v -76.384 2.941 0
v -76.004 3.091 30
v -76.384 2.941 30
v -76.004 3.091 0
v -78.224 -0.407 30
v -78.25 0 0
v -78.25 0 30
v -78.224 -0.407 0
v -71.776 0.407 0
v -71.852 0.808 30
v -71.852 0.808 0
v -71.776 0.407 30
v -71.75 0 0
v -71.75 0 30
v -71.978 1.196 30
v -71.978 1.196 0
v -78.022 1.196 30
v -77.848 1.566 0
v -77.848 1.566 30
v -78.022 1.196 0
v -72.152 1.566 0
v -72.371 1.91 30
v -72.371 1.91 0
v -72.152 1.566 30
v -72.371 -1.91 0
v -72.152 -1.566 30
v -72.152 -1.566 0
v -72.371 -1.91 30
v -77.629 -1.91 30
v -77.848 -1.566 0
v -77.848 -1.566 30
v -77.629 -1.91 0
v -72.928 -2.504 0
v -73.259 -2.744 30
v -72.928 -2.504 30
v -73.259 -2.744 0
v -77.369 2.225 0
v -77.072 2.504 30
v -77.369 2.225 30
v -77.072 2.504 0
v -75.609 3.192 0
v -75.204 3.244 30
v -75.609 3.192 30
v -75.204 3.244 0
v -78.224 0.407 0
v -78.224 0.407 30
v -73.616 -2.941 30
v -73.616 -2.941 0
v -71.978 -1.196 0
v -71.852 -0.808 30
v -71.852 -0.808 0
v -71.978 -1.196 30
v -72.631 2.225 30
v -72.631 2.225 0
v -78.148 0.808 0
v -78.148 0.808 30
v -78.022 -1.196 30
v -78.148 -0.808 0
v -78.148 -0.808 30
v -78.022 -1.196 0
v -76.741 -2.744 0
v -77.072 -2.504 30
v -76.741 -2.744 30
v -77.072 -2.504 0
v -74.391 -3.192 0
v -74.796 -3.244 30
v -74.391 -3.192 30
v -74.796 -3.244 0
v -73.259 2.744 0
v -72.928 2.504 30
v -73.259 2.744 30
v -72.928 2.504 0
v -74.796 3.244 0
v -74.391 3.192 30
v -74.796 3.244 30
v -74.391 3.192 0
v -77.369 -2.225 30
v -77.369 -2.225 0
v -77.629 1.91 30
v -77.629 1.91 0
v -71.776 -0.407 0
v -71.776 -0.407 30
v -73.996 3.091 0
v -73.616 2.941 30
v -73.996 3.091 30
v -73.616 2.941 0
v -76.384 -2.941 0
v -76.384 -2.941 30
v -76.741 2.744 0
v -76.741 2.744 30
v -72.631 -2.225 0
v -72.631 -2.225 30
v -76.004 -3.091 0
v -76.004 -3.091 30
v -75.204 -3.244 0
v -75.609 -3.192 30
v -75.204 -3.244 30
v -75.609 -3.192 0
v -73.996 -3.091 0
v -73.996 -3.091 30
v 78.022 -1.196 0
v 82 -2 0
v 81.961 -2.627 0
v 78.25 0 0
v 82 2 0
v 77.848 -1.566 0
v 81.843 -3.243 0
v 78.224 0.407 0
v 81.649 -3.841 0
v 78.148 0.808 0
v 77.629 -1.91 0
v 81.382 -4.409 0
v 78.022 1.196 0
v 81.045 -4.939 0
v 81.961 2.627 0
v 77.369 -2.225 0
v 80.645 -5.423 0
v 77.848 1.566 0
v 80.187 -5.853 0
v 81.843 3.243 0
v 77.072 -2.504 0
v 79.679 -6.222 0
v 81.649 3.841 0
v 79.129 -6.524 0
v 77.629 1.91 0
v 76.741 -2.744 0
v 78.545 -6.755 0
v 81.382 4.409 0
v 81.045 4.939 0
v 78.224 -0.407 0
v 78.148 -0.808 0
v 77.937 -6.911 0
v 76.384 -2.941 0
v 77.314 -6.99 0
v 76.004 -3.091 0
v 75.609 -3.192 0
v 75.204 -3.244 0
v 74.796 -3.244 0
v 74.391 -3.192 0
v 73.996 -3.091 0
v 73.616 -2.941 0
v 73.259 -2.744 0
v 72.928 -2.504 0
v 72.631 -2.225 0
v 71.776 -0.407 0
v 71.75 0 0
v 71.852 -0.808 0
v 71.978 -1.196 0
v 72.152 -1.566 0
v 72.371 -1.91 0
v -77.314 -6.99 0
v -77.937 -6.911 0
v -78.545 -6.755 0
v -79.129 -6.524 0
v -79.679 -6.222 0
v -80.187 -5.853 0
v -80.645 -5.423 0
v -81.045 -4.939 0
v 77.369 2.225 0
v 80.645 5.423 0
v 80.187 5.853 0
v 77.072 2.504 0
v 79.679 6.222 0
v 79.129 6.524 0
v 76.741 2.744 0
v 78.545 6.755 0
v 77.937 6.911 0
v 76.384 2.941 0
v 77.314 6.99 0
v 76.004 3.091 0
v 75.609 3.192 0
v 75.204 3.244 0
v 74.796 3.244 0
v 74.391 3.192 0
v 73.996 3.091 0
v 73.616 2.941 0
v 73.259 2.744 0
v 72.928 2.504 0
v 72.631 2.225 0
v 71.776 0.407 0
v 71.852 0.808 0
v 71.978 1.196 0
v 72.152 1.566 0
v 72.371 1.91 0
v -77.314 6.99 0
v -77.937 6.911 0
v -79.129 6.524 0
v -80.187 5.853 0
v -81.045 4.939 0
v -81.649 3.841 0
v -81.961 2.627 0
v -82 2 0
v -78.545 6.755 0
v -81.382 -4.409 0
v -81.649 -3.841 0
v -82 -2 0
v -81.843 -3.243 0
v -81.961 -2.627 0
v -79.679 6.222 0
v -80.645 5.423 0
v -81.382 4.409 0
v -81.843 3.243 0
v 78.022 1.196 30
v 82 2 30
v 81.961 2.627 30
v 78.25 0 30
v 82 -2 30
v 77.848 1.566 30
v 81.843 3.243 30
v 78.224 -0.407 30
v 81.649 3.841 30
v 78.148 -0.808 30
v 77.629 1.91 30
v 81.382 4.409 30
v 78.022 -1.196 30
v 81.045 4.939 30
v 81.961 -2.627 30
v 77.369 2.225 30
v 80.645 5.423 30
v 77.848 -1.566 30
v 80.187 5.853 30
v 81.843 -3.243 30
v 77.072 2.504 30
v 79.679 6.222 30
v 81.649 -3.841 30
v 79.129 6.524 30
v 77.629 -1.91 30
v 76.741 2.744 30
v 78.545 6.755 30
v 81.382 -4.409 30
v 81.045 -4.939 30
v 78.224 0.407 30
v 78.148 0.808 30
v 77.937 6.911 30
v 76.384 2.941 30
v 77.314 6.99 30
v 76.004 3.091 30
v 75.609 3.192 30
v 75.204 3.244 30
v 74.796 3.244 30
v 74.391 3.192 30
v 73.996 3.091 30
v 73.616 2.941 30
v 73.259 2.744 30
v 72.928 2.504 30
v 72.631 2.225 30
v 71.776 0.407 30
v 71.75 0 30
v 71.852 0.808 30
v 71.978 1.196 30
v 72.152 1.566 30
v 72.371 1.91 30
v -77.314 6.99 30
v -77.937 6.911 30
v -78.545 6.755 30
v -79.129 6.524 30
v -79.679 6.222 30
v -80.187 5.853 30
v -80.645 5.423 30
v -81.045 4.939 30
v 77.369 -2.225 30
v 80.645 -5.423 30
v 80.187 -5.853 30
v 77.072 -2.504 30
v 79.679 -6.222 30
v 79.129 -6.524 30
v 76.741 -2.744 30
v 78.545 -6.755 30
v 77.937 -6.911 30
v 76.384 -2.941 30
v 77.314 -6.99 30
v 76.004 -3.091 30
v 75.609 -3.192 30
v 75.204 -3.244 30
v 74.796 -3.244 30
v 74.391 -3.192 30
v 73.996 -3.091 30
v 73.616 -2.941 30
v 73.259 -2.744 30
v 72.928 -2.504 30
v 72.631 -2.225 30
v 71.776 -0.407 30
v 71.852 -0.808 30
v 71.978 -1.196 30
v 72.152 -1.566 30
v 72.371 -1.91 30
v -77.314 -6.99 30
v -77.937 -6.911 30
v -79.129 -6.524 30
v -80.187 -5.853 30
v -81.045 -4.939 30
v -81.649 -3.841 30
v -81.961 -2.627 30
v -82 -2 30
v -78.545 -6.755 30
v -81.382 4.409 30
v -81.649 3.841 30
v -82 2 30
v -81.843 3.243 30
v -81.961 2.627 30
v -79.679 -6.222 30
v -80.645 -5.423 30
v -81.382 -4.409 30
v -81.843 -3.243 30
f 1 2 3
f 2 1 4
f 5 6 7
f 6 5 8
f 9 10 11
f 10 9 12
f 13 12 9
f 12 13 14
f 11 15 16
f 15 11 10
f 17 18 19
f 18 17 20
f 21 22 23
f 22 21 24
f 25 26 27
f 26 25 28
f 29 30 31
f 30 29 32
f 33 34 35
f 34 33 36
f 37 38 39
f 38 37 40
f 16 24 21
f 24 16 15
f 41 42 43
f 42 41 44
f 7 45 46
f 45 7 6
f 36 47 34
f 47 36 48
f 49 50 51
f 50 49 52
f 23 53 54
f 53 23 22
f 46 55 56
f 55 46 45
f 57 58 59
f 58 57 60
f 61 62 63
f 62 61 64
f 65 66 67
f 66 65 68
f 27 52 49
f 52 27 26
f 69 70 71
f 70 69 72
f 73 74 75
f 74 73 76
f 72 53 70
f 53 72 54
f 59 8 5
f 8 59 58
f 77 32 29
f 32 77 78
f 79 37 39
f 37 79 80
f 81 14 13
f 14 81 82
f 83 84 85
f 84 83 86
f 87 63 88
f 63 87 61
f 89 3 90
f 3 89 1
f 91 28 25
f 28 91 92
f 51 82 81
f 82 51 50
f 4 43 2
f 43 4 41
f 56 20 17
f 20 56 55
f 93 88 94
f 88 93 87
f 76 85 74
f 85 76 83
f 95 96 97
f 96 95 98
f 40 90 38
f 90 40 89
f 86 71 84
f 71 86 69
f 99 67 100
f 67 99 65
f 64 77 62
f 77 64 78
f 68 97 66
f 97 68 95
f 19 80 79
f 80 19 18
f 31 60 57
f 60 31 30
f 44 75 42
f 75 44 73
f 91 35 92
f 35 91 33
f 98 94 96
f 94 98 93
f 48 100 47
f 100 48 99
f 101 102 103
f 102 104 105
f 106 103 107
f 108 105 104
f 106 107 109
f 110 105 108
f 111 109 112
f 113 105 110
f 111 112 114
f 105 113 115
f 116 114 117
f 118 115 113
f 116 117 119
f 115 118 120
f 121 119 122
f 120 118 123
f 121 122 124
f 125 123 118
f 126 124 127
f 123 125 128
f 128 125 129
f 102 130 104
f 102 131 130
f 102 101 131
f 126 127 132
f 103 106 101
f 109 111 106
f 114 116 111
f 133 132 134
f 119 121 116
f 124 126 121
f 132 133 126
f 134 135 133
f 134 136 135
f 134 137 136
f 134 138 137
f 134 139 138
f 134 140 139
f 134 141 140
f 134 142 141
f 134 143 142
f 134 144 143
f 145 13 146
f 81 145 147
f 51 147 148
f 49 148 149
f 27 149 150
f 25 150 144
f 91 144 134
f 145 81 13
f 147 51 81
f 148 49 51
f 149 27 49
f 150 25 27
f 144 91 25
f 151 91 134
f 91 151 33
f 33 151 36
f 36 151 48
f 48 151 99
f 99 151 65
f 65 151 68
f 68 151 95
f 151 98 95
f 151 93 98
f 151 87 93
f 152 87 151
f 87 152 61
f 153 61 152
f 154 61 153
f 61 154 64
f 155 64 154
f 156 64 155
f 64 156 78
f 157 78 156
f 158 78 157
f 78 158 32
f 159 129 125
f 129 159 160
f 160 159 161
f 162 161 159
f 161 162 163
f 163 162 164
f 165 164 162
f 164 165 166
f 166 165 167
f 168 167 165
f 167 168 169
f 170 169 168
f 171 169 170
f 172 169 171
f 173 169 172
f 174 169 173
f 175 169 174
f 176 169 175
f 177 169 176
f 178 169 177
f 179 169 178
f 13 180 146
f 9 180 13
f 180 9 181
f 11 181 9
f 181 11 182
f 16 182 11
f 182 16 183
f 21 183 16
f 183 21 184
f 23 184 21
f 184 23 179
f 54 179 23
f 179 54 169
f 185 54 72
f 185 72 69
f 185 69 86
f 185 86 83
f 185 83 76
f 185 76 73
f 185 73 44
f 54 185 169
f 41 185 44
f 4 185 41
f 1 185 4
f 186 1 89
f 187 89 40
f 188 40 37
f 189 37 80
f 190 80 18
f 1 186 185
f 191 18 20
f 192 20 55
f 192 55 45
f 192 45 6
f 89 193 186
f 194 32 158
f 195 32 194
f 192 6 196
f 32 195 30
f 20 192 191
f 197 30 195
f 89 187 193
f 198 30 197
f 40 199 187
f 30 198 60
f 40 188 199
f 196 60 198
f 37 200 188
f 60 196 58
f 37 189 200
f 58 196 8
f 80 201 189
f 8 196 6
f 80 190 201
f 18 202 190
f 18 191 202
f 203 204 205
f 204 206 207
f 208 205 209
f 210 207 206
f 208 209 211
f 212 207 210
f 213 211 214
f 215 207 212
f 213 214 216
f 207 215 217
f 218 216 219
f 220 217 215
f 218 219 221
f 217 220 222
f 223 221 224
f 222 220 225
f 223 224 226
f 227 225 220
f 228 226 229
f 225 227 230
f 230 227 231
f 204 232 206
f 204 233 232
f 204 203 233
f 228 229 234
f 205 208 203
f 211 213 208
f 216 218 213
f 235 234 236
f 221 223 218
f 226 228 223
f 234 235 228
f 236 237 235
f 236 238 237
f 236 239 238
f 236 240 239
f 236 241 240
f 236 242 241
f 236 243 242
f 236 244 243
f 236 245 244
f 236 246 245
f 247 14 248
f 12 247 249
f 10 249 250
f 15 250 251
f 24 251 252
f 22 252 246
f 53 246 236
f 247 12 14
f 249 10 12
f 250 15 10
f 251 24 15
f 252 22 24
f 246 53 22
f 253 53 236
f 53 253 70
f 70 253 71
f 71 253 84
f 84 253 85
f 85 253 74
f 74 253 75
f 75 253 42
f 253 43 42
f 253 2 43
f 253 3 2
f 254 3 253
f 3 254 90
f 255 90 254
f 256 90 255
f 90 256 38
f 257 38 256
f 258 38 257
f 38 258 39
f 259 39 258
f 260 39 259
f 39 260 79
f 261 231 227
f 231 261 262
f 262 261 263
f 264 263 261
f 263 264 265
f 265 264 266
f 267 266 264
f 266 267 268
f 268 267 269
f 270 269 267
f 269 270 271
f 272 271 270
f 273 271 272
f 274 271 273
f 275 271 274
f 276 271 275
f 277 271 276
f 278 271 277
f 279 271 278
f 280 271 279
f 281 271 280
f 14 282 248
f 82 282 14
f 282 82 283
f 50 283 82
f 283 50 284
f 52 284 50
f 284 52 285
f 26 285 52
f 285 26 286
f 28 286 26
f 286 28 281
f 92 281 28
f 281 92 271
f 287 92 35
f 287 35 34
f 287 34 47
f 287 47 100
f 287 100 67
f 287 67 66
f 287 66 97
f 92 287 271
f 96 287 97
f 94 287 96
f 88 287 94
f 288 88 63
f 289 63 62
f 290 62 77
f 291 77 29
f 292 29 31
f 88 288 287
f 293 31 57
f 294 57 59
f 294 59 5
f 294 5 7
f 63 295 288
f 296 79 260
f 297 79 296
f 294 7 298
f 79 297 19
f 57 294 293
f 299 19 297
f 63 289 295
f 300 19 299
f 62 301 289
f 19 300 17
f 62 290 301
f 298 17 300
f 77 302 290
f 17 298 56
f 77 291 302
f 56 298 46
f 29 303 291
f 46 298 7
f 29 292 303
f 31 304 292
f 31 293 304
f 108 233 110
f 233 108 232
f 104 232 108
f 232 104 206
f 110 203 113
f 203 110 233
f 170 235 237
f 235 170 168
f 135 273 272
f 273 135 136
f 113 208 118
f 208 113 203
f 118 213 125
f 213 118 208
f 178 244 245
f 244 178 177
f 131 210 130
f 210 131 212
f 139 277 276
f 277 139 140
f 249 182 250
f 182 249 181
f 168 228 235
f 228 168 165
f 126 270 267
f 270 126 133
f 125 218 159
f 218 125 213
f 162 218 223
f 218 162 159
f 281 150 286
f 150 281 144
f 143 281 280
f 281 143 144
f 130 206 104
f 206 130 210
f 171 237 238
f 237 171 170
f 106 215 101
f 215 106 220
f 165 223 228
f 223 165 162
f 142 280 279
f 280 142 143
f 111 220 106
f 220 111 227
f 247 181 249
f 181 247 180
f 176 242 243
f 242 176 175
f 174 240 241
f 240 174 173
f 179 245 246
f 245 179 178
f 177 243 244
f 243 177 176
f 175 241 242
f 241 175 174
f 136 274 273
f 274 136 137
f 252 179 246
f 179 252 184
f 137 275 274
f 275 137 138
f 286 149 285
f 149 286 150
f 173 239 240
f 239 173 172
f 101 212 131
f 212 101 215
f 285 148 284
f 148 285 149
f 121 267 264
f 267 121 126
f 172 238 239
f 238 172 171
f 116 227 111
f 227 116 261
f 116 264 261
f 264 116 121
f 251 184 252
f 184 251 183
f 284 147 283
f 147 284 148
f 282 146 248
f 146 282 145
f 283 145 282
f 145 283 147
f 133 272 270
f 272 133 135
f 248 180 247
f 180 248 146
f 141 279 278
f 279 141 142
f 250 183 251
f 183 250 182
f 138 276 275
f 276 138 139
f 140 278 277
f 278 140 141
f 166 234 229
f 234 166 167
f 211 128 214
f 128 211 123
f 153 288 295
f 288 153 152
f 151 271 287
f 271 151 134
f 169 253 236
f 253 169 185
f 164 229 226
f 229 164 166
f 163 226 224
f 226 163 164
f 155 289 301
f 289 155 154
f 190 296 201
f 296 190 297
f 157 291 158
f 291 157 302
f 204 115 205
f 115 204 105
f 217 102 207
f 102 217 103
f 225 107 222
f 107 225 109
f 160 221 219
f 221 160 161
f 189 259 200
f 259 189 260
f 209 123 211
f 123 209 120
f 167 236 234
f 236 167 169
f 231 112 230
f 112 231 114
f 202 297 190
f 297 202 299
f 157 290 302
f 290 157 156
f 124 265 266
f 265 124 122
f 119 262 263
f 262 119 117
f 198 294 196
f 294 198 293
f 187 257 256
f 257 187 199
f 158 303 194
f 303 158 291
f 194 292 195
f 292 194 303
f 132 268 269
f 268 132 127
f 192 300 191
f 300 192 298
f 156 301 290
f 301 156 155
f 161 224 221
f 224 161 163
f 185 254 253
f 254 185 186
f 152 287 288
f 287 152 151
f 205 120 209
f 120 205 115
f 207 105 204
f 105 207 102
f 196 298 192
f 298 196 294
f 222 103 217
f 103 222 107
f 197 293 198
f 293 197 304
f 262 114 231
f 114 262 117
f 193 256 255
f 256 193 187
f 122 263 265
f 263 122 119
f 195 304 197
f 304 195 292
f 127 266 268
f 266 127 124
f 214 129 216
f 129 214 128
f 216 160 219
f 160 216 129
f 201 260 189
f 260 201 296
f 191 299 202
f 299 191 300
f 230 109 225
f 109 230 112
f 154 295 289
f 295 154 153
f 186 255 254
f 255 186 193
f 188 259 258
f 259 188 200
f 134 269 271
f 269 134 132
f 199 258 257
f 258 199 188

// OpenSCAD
$fn = 50;


difference() {
	union() {
		hull() {
			translate(v = [-77.0000000000, 2.0000000000, 0]) {
				cylinder(h = 30, r = 5);
			}
			translate(v = [77.0000000000, 2.0000000000, 0]) {
				cylinder(h = 30, r = 5);
			}
			translate(v = [-77.0000000000, -2.0000000000, 0]) {
				cylinder(h = 30, r = 5);
			}
			translate(v = [77.0000000000, -2.0000000000, 0]) {
				cylinder(h = 30, r = 5);
			}
		}
	}
	union() {
		translate(v = [-75.0000000000, 0.0000000000, 0]) {
			cylinder(h = 30, r = 3.2500000000);
		}
		translate(v = [75.0000000000, 0.0000000000, 0]) {
			cylinder(h = 30, r = 3.2500000000);
		}
		translate(v = [-75.0000000000, 0.0000000000, 0]) {
			cylinder(h = 30, r = 1.8000000000);
		}
		translate(v = [75.0000000000, 0.0000000000, 0]) {
			cylinder(h = 30, r = 1.8000000000);
		}
		translate(v = [-75.0000000000, 0.0000000000, 0]) {
			cylinder(h = 30, r = 1.8000000000);
		}
		translate(v = [75.0000000000, 0.0000000000, 0]) {
			cylinder(h = 30, r = 1.8000000000);
		}
		translate(v = [-75.0000000000, 0.0000000000, 0]) {
			cylinder(h = 30, r = 1.8000000000);
		}
		translate(v = [75.0000000000, 0.0000000000, 0]) {
			cylinder(h = 30, r = 1.8000000000);
		}
	}
}
